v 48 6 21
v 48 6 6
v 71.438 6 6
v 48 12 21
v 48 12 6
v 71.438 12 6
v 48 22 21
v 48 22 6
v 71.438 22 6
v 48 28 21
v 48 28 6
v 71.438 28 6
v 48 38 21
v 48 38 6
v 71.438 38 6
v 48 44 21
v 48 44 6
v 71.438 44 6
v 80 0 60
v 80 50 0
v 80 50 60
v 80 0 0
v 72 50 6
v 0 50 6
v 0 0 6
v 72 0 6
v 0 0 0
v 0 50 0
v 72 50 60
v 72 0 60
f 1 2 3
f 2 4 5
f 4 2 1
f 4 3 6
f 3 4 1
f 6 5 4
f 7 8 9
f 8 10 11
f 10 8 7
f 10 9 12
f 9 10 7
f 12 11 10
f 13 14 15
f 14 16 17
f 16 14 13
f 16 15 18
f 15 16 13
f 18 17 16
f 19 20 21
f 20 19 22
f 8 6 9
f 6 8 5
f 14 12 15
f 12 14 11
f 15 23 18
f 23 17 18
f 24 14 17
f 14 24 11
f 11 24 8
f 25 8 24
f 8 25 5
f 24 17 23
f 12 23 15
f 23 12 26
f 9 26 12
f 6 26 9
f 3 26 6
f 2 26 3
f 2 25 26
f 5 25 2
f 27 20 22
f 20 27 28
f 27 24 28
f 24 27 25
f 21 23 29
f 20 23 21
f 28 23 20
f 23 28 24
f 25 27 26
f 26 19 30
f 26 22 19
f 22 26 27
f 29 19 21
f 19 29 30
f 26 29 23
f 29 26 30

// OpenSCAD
$fn = 32;

// ----------------------------------------------------------------------
// Rib bracket: 3-gusset L bracket
// ----------------------------------------------------------------------

// --- parameters (mm) ---
base_l = 80;              // foot length, X
base_w = 50;              // foot width, Y
base_t = 6;               // foot thickness
plate_t = 8;              // upright plate thickness
plate_h = 60;             // overall height
gus_l = 24;               // gusset leg along the foot
gus_h = 16;               // gusset height
gus_t = 6;                // gusset thickness
gus_edge = 6;             // gusset margin from the foot edge
n_gus = 3;                // gusset count

gus_pitch = (base_w - 2 * gus_edge - gus_t) / (n_gus - 1);  // gusset pitch

union() {
  cube([base_l, base_w, base_t]);
  translate([base_l - plate_t, 0, base_t - 1])
    cube([plate_t, base_w, plate_h - base_t + 1]);
  for (i = [0 : n_gus - 1])
    translate([base_l - plate_t - gus_l, gus_edge + i * gus_pitch, base_t - 1])
      rotate([-90, 0, 0])
        linear_extrude(height = gus_t)
          polygon(points = [[0, 0], [gus_l + 1, 0], [0, -gus_h]]);
}
